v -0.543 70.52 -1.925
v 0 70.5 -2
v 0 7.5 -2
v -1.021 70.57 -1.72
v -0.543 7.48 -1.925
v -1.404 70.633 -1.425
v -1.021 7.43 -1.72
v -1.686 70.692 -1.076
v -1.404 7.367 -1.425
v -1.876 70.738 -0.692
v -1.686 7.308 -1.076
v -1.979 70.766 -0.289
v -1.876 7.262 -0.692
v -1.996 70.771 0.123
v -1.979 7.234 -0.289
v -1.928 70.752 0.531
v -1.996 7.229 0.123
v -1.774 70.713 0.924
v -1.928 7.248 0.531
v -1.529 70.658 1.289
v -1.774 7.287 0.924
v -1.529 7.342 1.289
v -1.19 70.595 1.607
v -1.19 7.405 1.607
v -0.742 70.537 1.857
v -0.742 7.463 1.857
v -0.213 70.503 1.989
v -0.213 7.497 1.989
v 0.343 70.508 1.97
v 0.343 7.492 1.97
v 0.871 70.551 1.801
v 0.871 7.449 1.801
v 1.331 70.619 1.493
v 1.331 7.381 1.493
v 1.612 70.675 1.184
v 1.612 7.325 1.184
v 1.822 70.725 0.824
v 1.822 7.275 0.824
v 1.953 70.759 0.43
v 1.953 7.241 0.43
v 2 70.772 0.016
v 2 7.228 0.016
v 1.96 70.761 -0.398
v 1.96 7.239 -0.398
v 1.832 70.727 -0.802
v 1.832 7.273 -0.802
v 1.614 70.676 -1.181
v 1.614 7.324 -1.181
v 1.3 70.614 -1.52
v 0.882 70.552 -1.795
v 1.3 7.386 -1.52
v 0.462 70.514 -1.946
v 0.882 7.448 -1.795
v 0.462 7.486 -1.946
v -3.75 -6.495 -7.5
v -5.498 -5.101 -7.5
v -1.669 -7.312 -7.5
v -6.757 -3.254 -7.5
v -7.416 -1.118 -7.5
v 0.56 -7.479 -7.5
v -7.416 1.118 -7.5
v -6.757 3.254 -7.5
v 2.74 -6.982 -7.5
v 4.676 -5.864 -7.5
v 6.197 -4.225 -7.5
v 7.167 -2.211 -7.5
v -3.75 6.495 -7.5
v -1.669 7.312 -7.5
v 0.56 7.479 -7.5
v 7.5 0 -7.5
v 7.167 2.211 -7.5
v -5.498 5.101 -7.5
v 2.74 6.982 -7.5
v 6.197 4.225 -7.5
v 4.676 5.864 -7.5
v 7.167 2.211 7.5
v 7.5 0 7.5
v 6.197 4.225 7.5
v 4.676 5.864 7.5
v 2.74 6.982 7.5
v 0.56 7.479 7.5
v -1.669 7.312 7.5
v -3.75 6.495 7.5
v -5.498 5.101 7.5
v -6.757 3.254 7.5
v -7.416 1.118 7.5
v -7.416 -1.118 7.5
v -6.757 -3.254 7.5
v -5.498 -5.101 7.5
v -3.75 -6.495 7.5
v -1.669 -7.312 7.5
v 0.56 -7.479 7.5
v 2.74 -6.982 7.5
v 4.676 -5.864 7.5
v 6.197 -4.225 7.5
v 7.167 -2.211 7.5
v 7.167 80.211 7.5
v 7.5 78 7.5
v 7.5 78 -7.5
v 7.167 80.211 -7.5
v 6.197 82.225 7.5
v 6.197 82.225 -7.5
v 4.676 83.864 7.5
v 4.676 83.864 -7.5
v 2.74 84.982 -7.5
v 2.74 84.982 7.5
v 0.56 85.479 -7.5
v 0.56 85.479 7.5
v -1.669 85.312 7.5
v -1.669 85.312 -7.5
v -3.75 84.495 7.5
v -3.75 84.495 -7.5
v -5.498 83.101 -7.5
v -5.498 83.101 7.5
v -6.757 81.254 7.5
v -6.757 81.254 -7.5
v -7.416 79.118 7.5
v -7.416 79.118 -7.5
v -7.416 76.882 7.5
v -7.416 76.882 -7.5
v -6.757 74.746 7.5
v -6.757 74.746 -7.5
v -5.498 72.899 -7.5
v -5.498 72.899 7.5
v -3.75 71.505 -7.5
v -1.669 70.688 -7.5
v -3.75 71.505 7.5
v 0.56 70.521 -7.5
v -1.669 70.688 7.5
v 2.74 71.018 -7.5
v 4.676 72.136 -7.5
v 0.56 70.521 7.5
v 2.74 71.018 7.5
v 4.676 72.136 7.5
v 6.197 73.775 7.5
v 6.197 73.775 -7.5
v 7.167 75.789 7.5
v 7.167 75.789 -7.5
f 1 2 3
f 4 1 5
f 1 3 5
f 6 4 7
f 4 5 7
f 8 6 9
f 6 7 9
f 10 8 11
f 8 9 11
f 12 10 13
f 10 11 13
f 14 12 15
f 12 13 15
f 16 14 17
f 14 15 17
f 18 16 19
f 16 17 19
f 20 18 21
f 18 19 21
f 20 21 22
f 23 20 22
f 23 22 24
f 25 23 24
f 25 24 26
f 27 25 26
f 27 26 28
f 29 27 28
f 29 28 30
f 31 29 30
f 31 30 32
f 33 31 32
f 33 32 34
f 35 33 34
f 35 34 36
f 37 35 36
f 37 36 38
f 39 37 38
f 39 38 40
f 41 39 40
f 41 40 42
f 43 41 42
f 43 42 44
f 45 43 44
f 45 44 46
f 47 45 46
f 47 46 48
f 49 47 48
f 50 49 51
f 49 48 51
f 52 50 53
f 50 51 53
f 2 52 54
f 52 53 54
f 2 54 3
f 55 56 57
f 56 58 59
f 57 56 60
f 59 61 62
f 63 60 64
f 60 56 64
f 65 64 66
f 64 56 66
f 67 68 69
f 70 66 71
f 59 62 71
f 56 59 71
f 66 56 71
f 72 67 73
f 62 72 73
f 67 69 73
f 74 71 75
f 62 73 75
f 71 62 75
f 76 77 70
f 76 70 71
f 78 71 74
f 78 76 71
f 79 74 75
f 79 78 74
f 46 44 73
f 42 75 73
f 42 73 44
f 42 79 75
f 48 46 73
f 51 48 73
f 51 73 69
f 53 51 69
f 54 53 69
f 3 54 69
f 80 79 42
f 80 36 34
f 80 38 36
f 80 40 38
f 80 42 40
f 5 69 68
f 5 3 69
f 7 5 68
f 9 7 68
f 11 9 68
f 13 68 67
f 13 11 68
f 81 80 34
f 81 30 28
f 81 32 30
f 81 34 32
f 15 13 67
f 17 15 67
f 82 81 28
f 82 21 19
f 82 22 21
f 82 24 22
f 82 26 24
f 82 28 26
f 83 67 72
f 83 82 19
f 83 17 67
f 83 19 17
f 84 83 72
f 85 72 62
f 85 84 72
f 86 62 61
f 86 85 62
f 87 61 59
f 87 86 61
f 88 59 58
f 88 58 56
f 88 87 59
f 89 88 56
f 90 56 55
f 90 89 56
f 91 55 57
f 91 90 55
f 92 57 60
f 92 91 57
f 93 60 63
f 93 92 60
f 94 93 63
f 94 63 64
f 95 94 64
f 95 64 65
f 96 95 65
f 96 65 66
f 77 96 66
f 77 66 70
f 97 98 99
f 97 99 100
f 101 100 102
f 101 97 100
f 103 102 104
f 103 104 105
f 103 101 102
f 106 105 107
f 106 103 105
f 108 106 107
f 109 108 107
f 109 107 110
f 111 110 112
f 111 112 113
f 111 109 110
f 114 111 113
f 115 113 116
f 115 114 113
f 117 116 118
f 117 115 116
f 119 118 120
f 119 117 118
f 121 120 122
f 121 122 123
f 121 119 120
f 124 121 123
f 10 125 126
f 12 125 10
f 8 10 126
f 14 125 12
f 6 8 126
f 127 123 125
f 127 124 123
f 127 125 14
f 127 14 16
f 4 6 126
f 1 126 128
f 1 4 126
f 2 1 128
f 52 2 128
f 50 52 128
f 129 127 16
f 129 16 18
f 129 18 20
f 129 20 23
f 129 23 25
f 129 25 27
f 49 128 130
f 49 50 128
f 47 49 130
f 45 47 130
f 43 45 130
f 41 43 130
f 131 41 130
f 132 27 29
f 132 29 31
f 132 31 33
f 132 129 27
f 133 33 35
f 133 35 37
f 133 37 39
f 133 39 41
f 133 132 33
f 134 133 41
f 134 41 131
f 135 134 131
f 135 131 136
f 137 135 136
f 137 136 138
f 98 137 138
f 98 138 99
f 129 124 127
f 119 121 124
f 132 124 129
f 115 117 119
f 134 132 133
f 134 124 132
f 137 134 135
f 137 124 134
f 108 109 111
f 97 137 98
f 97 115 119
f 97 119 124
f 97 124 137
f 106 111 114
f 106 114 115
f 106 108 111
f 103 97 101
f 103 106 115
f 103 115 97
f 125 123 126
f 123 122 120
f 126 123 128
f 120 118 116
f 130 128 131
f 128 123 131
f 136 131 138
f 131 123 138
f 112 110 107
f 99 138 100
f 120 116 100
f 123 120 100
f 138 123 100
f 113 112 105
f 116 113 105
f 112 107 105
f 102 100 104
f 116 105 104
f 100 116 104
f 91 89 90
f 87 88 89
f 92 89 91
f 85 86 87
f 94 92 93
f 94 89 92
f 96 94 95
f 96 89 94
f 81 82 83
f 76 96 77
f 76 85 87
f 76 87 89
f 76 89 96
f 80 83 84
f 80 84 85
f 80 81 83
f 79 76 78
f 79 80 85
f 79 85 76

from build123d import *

# Parameters (mm, degrees)
SKETCH2_R           = 7.5
BOSS_EXTRUDE1_DEPTH = 7.5
SKETCH4_R           = 2
BOSS_EXTRUDE2_DEPTH = 78
LPATTERN1_COUNT     = 2
LPATTERN1_PITCH     = 78


with BuildPart() as part:
    # Sketch2 → Boss-Extrude1 (new, symmetric)
    with BuildSketch(Plane.XY):
        Circle(SKETCH2_R)
    boss_extrude1 = extrude(amount=BOSS_EXTRUDE1_DEPTH, both=True)

    # Sketch4 → Boss-Extrude2 (add)
    with BuildSketch(Plane(origin=(0, 0, 0), x_dir=(1, 0, 0), z_dir=(0, 1, 0))):
        with Locations(Location((0, 0, 0), (0, 0, 90))):
            Circle(SKETCH4_R)
    extrude(amount=BOSS_EXTRUDE2_DEPTH)

    # LPattern1: Boss-Extrude1 ×2
    with Locations(*[(0, i * LPATTERN1_PITCH, 0) for i in range(1, LPATTERN1_COUNT)]):
        add(boss_extrude1)


solid = part.part
